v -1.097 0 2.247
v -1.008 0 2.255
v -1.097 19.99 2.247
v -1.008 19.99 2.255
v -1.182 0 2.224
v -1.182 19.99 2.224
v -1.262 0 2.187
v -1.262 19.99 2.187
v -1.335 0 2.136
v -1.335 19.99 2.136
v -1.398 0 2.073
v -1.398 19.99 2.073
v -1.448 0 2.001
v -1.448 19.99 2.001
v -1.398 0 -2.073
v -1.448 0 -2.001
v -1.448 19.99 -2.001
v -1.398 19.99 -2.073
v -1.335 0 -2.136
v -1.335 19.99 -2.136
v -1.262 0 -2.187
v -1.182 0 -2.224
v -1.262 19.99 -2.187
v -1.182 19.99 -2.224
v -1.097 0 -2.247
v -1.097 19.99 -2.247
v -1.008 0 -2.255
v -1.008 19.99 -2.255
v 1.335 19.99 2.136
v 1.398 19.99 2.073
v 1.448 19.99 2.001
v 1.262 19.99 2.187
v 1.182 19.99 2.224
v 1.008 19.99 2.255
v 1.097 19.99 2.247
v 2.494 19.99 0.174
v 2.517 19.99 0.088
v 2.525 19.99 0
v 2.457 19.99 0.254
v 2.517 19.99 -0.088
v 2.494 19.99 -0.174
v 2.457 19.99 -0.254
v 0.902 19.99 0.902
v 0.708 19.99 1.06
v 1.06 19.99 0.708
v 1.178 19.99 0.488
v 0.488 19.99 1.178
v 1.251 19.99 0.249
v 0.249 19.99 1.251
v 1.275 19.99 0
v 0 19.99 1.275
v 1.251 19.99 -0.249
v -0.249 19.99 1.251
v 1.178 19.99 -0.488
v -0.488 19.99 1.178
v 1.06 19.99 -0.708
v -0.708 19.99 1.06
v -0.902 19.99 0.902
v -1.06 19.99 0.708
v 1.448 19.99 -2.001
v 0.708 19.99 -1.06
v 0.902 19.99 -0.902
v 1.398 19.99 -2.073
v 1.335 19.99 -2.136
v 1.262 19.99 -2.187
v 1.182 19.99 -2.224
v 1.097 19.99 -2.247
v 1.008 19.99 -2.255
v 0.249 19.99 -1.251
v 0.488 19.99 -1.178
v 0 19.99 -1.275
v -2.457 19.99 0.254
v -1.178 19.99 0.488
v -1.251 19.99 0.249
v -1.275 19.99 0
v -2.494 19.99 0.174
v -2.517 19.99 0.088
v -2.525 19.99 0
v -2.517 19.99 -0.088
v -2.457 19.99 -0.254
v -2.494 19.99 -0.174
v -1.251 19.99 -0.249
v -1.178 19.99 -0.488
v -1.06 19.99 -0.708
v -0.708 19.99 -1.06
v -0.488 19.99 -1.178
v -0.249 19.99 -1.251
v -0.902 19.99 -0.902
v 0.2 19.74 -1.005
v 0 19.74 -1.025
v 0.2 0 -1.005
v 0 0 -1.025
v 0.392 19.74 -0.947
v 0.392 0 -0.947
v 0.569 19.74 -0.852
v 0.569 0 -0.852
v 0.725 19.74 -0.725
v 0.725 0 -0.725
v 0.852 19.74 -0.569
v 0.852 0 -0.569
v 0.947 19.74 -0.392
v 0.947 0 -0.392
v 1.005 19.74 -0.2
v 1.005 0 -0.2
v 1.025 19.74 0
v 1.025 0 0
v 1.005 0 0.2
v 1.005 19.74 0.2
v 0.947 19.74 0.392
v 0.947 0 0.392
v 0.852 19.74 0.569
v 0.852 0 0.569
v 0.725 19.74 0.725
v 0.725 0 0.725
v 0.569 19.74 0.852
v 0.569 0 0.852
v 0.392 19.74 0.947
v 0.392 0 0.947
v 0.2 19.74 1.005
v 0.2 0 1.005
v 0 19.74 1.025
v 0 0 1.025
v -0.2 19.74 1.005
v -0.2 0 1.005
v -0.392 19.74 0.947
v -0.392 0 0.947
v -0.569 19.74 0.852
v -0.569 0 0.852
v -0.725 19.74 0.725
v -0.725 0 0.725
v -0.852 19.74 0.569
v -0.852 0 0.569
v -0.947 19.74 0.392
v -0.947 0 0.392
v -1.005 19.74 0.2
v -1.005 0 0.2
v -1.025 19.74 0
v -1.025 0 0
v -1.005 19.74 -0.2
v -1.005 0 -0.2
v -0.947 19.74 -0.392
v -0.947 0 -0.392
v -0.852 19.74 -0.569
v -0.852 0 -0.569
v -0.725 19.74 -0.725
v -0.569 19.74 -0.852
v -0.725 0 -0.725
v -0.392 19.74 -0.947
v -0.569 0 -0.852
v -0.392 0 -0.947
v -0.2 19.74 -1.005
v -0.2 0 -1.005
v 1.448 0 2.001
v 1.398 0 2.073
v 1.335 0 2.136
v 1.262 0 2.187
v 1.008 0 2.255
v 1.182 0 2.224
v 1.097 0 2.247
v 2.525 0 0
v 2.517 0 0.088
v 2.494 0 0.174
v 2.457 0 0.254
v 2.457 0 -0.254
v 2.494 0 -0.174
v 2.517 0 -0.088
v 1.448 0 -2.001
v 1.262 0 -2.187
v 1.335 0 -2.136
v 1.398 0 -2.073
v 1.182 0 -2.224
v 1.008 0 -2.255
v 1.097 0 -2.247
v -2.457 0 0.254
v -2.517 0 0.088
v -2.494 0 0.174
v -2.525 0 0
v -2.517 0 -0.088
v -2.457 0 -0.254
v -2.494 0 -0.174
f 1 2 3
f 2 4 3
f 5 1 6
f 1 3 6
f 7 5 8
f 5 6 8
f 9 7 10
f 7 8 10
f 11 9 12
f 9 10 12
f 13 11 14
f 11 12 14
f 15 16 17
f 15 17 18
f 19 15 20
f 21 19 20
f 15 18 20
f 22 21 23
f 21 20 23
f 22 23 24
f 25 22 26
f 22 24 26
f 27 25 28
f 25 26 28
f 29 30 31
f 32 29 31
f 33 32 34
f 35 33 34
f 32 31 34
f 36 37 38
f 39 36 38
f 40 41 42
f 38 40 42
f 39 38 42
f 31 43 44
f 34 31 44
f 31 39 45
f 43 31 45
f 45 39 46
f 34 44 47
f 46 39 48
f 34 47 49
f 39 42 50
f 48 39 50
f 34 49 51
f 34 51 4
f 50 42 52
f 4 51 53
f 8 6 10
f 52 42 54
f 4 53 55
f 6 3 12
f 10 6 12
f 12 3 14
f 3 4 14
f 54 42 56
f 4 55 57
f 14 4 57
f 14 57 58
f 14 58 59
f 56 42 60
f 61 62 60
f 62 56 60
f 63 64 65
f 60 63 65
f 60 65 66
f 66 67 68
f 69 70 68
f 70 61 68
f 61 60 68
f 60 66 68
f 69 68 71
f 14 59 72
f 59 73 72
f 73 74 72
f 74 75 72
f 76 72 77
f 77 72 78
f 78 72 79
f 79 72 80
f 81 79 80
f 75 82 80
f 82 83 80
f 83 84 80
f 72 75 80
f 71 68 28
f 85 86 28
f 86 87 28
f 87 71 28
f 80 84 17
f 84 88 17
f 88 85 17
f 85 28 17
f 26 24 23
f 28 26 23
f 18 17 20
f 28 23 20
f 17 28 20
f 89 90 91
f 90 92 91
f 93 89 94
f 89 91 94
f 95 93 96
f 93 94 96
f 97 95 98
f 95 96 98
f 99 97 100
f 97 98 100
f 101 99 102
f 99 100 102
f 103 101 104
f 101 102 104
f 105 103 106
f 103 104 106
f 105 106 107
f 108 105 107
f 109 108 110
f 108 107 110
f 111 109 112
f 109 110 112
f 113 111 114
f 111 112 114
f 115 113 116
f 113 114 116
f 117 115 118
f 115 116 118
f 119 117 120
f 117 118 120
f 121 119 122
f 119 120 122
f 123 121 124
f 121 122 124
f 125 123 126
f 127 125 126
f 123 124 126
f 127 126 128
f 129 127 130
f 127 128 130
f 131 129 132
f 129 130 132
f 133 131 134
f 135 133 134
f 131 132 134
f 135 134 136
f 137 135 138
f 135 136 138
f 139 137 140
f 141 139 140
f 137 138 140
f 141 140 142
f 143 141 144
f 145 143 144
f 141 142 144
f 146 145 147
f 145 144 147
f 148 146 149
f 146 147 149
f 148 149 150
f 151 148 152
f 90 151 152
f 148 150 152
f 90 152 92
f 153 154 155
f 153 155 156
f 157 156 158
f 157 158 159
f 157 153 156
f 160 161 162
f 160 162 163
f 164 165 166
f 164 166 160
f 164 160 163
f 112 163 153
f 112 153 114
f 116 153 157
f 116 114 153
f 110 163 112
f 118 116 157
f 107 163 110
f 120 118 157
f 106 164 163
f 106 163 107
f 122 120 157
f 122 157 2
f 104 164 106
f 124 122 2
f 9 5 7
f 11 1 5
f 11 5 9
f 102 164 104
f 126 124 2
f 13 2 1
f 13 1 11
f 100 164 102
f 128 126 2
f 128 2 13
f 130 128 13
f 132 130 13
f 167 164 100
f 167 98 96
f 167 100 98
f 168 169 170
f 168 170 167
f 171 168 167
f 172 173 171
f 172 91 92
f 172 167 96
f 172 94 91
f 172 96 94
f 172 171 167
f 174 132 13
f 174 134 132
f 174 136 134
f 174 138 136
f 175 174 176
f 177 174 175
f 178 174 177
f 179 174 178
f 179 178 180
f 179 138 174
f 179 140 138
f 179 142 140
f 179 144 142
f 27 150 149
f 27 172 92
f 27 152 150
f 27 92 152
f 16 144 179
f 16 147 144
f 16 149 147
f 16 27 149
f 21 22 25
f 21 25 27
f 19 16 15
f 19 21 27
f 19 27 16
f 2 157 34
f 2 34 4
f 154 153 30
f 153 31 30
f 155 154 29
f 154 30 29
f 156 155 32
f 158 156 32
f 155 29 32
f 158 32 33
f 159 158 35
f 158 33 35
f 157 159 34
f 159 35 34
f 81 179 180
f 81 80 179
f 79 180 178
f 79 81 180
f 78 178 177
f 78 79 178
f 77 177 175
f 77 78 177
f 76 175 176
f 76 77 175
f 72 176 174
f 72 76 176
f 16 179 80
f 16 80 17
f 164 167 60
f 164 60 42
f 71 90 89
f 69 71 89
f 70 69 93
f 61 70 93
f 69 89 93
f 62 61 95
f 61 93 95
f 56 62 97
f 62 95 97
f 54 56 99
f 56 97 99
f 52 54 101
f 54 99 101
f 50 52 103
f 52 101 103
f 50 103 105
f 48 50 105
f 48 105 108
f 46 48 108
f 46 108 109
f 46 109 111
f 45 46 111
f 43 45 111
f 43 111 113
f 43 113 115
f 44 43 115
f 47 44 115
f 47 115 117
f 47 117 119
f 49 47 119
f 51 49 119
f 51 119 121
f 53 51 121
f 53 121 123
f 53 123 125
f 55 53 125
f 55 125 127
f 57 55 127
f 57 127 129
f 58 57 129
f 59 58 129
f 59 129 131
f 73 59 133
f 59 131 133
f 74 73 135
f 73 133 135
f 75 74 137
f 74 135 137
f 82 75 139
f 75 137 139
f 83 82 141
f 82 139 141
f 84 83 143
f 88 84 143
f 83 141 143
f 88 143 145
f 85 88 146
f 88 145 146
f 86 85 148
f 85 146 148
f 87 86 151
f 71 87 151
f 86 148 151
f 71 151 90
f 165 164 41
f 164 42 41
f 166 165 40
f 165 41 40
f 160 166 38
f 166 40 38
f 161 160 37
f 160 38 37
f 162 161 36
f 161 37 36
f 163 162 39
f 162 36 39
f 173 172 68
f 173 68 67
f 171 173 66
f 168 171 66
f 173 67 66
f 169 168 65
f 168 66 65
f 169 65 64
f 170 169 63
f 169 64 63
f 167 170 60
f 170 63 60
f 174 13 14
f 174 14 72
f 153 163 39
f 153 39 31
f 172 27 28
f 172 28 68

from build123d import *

# Parameters (mm, degrees)
BOSS_EXTRUDE1_DEPTH                = 19.9898
FILLET1_R                          = 0.508
M2_5X0_45_TAPPED_HOLE1_D           = 2.05
M2_5X0_45_TAPPED_HOLE1_CSINK_D     = 2.55
M2_5X0_45_TAPPED_HOLE1_CSINK_ANGLE = 90


with BuildPart() as part:
    # Sketch1 → Boss-Extrude1 (new body)
    with BuildSketch(Plane(origin=(0, 0, 0), x_dir=(1, 0, 0), z_dir=(0, 1, 0))):
        Polygon((-2.6035, 0), (-1.30175, 2.254697139), (1.30175, 2.254697139), (2.6035, 0), (1.30175, -2.254697139), (-1.30175, -2.254697139), align=None)
    extrude(amount=BOSS_EXTRUDE1_DEPTH)

    # Fillet1
    fillet1_edges = [part.edges().sort_by_distance(p)[0] for p in [
        (-2.6035, 9.9949, 0),
        (-1.30175, 9.9949, 2.254697139),
        (1.30175, 9.9949, 2.254697139),
        (2.6035, 9.9949, 0),
        (1.30175, 9.9949, -2.254697139),
        (-1.30175, 9.9949, -2.254697139),
    ]]
    fillet(fillet1_edges, radius=FILLET1_R)

    # M2.5x0.45 Tapped Hole1 (through all)
    with Locations(Plane.ZX.offset(19.9898)):
        with Locations((0, 0)):
            CounterSinkHole(M2_5X0_45_TAPPED_HOLE1_D / 2, M2_5X0_45_TAPPED_HOLE1_CSINK_D / 2, counter_sink_angle=M2_5X0_45_TAPPED_HOLE1_CSINK_ANGLE)


solid = part.part
